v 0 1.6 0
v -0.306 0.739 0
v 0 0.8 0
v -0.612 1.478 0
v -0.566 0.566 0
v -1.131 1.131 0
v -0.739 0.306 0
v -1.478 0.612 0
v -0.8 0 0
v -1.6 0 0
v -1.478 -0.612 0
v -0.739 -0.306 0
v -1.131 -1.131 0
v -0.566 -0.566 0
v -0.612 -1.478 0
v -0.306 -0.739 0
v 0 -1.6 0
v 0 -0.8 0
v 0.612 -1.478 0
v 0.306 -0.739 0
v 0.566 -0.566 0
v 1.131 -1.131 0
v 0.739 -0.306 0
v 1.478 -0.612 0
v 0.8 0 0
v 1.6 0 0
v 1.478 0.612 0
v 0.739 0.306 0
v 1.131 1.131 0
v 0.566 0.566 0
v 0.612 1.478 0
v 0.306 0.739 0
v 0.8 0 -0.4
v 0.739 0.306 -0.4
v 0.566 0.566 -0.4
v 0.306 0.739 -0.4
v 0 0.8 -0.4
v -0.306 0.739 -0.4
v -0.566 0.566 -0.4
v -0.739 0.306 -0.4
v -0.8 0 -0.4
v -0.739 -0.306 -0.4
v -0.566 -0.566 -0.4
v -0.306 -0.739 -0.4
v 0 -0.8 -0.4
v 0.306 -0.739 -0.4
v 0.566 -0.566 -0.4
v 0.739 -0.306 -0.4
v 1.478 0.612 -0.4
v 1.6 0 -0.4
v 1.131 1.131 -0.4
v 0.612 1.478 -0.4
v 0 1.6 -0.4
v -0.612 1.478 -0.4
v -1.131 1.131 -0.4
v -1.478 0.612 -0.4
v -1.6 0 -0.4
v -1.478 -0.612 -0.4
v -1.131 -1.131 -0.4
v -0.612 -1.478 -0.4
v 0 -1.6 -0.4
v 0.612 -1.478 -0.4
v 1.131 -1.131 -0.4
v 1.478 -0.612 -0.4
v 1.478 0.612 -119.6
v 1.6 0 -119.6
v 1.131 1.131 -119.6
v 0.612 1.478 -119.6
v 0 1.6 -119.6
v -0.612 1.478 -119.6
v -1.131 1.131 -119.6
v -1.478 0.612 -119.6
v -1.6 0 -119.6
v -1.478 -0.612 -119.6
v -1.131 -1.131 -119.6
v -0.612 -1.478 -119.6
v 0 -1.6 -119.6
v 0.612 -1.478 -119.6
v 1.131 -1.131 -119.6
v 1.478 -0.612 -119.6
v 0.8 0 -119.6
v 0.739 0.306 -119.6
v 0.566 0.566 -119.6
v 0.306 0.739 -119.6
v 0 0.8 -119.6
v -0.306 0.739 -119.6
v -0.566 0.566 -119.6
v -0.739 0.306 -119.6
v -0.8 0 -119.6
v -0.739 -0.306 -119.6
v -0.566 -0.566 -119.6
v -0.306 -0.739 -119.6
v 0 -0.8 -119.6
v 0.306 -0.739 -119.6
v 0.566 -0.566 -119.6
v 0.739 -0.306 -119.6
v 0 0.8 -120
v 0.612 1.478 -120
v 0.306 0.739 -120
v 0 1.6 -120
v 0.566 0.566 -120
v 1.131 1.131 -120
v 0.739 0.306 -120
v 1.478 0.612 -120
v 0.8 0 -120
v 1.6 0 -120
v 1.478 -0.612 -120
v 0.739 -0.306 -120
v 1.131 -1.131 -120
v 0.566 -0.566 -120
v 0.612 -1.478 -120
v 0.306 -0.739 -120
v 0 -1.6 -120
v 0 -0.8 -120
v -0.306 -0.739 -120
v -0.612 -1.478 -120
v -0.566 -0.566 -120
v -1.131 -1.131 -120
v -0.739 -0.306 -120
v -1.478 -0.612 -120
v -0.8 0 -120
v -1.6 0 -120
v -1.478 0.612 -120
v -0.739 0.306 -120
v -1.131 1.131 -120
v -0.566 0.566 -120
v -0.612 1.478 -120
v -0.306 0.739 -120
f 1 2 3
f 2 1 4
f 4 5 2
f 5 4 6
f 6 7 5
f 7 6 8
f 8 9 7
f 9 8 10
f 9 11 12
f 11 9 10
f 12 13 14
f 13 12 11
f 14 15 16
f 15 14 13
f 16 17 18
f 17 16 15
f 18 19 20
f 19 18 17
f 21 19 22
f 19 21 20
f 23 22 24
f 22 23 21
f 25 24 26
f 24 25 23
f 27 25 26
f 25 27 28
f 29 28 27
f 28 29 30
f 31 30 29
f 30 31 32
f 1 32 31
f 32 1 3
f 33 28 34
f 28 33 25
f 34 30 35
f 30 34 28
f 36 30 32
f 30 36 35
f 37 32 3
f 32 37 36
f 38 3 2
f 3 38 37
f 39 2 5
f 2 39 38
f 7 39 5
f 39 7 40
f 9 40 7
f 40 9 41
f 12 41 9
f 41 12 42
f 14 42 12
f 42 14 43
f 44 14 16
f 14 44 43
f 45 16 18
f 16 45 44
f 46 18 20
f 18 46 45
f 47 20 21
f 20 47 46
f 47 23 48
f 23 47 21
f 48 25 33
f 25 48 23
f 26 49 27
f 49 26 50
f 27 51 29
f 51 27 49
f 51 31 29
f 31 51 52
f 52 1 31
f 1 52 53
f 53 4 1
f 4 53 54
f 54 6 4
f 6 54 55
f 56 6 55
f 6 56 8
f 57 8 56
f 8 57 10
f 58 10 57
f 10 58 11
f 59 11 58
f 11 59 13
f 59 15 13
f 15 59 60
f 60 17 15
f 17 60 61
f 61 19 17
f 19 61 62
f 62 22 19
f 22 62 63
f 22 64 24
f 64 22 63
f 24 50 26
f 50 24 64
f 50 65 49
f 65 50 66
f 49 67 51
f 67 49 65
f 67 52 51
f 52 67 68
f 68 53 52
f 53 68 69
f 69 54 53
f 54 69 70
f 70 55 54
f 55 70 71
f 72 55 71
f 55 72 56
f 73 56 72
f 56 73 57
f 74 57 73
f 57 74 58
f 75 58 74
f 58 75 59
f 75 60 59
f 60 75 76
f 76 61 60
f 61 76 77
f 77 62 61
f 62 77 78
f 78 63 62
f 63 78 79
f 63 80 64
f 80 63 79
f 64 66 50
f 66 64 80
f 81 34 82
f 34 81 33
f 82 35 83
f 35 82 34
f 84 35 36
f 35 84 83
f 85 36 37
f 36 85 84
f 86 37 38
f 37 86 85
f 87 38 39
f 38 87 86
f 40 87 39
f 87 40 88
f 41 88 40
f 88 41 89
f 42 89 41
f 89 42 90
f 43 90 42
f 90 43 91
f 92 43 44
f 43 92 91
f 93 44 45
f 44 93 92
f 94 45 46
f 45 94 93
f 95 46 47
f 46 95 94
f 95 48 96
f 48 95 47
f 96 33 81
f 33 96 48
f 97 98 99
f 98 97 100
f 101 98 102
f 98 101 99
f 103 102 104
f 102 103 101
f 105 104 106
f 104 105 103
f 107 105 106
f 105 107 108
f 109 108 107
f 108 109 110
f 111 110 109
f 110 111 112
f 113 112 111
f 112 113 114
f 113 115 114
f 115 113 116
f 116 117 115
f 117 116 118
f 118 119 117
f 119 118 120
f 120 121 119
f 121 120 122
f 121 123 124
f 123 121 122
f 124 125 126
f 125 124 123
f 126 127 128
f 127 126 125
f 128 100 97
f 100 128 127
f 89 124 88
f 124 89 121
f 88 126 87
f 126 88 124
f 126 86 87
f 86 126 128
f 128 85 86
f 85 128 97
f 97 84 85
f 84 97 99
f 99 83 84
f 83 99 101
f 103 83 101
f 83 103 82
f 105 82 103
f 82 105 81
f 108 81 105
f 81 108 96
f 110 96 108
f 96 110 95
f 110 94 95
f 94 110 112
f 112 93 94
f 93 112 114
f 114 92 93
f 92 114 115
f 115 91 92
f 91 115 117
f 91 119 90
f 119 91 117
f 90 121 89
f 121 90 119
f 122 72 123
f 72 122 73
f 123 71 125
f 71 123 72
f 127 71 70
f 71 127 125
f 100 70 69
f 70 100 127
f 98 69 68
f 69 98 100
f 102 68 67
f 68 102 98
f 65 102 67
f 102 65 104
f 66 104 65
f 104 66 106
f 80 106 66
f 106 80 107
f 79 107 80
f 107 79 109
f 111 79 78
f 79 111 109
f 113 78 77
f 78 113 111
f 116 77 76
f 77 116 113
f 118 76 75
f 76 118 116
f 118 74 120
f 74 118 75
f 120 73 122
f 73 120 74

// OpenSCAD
// file: ../p/4-4ring1.scad
use <../lib.scad>
function ldraw_lib__4_4ring1() = [
// 0 Ring  1 x 1.0
// 0 Name: 4-4ring1.dat
// 0 Author: James Jessiman
// 0 !LDRAW_ORG Primitive UPDATE 2009-01
// 0 !LICENSE Licensed under CC BY 2.0 and CC BY 4.0 : see CAreadme.txt
// 
// 0 BFC CERTIFY CCW
  [0,"BFC","CERTIFY"],
  [0,"BFC","CCW"],
// 
// 0 !HISTORY 1998-12-15 [PTadmin] Official Update 1998-10
// 0 !HISTORY 2002-04-08 [BrickCaster] Modified for BFC compliance
// 0 !HISTORY 2002-04-25 [PTadmin] Official Update 2002-02
// 0 !HISTORY 2007-06-24 [PTadmin] Header formatted for Contributor Agreement
// 0 !HISTORY 2008-07-01 [PTadmin] Official Update 2008-01
// 0 !HISTORY 2008-08-26 [cwdee] Switch polygon winding and rename
// 0 !HISTORY 2009-05-02 [PTadmin] Official Update 2009-01
// 
// 
// 4 16 -0.7654 0 1.8478 -0.3827 0 0.9239 0 0 1 0 0 2
  [4,16,-0.7654,0,1.8478,-0.3827,0,0.9239,0,0,1,0,0,2],
// 4 16 -1.4142 0 1.4142 -0.7071 0 0.7071 -0.3827 0 0.9239 -0.7654 0 1.8478
  [4,16,-1.4142,0,1.4142,-0.7071,0,0.7071,-0.3827,0,0.9239,-0.7654,0,1.8478],
// 4 16 -1.8478 0 0.7654 -0.9239 0 0.3827 -0.7071 0 0.7071 -1.4142 0 1.41420
  [4,16,-1.8478,0,0.7654,-0.9239,0,0.3827,-0.7071,0,0.7071,-1.4142,0,1.41420],
// 4 16 -2 0 0 -1 0 0 -0.9239 0 0.3827 -1.8478 0 0.7654
  [4,16,-2,0,0,-1,0,0,-0.9239,0,0.3827,-1.8478,0,0.7654],
// 4 16 -1.8478 0 -0.7654 -0.9239 0 -0.3827 -1 0 0 -2 0 0
  [4,16,-1.8478,0,-0.7654,-0.9239,0,-0.3827,-1,0,0,-2,0,0],
// 4 16 -1.4142 0 -1.4142 -0.7071 0 -0.7071 -0.9239 0 -0.3827 -1.8478 0 -0.7654
  [4,16,-1.4142,0,-1.4142,-0.7071,0,-0.7071,-0.9239,0,-0.3827,-1.8478,0,-0.7654],
// 4 16 -0.7654 0 -1.8478 -0.3827 0 -0.9239 -0.7071 0 -0.7071 -1.4142 0 -1.4142
  [4,16,-0.7654,0,-1.8478,-0.3827,0,-0.9239,-0.7071,0,-0.7071,-1.4142,0,-1.4142],
// 4 16 0 0 -2 0 0 -1 -0.3827 0 -0.9239 -0.7654 0 -1.8478
  [4,16,0,0,-2,0,0,-1,-0.3827,0,-0.9239,-0.7654,0,-1.8478],
// 4 16 0.7654 0 -1.8478 0.3827 0 -0.9239 0 0 -1 0 0 -2
  [4,16,0.7654,0,-1.8478,0.3827,0,-0.9239,0,0,-1,0,0,-2],
// 4 16 1.4142 0 -1.4142 0.7071 0 -0.7071 0.3827 0 -0.9239 0.7654 0 -1.8478
  [4,16,1.4142,0,-1.4142,0.7071,0,-0.7071,0.3827,0,-0.9239,0.7654,0,-1.8478],
// 4 16 1.8478 0 -0.7654 0.9239 0 -0.3827 0.7071 0 -0.7071 1.4142 0 -1.4142
  [4,16,1.8478,0,-0.7654,0.9239,0,-0.3827,0.7071,0,-0.7071,1.4142,0,-1.4142],
// 4 16 2 0 0 1 0 0 0.9239 0 -0.3827 1.8478 0 -0.7654
  [4,16,2,0,0,1,0,0,0.9239,0,-0.3827,1.8478,0,-0.7654],
// 4 16 1.8478 0 0.7654 0.9239 0 0.3827 1 0 0 2 0 0
  [4,16,1.8478,0,0.7654,0.9239,0,0.3827,1,0,0,2,0,0],
// 4 16 1.4142 0 1.4142 0.7071 0 0.7071 0.9239 0 0.3827 1.8478 0 0.7654
  [4,16,1.4142,0,1.4142,0.7071,0,0.7071,0.9239,0,0.3827,1.8478,0,0.7654],
// 4 16 0.7654 0 1.8478 0.3827 0 0.9239 0.7071 0 0.7071 1.4142 0 1.4142
  [4,16,0.7654,0,1.8478,0.3827,0,0.9239,0.7071,0,0.7071,1.4142,0,1.4142],
// 4 16 0 0 2 0 0 1 0.3827 0 0.9239 0.7654 0 1.8478
  [4,16,0,0,2,0,0,1,0.3827,0,0.9239,0.7654,0,1.8478],
// 0
];
makepoly(ldraw_lib__4_4ring1(), line=0.2);
// file: ../p/4-4edge.scad
use <../lib.scad>
function ldraw_lib__4_4edge() = [
// 0 Circle 1.0
// 0 Name: 4-4edge.dat
// 0 Author: James Jessiman
// 0 !LDRAW_ORG Primitive UPDATE 2017-01
// 0 !LICENSE Licensed under CC BY 2.0 and CC BY 4.0 : see CAreadme.txt
// 
// 0 BFC CERTIFY CCW
  [0,"BFC","CERTIFY"],
  [0,"BFC","CCW"],
// 
// 0 !HISTORY 1998-12-15 [PTadmin] Official Update 1998-10
// 0 !HISTORY 2005-12-28 [PTadmin] Official Update 2005-01
// 0 !HISTORY 2007-06-24 [PTadmin] Header formatted for Contributor Agreement
// 0 !HISTORY 2008-07-01 [PTadmin] Official Update 2008-01
// 0 !HISTORY 2017-01-15 [Steffen] BFCed
// 0 !HISTORY 2017-12-30 [PTadmin] Official Update 2017-01
// 
// 
// 2 24 1 0 0 0.9239 0 0.3827
  [2,24,1,0,0,0.9239,0,0.3827],
// 2 24 0.9239 0 0.3827 0.7071 0 0.7071
  [2,24,0.9239,0,0.3827,0.7071,0,0.7071],
// 2 24 0.7071 0 0.7071 0.3827 0 0.9239
  [2,24,0.7071,0,0.7071,0.3827,0,0.9239],
// 2 24 0.3827 0 0.9239 0 0 1
  [2,24,0.3827,0,0.9239,0,0,1],
// 2 24 0 0 1 -0.3827 0 0.9239
  [2,24,0,0,1,-0.3827,0,0.9239],
// 2 24 -0.3827 0 0.9239 -0.7071 0 0.7071
  [2,24,-0.3827,0,0.9239,-0.7071,0,0.7071],
// 2 24 -0.7071 0 0.7071 -0.9239 0 0.3827
  [2,24,-0.7071,0,0.7071,-0.9239,0,0.3827],
// 2 24 -0.9239 0 0.3827 -1 0 -0
  [2,24,-0.9239,0,0.3827,-1,0,-0],
// 2 24 -1 0 -0 -0.9239 0 -0.3827
  [2,24,-1,0,-0,-0.9239,0,-0.3827],
// 2 24 -0.9239 0 -0.3827 -0.7071 0 -0.7071
  [2,24,-0.9239,0,-0.3827,-0.7071,0,-0.7071],
// 2 24 -0.7071 0 -0.7071 -0.3827 0 -0.9239
  [2,24,-0.7071,0,-0.7071,-0.3827,0,-0.9239],
// 2 24 -0.3827 0 -0.9239 0 0 -1
  [2,24,-0.3827,0,-0.9239,0,0,-1],
// 2 24 0 0 -1 0.3827 0 -0.9239
  [2,24,0,0,-1,0.3827,0,-0.9239],
// 2 24 0.3827 0 -0.9239 0.7071 0 -0.7071
  [2,24,0.3827,0,-0.9239,0.7071,0,-0.7071],
// 2 24 0.7071 0 -0.7071 0.9239 0 -0.3827
  [2,24,0.7071,0,-0.7071,0.9239,0,-0.3827],
// 2 24 0.9239 0 -0.3827 1 0 0
  [2,24,0.9239,0,-0.3827,1,0,0],
];
makepoly(ldraw_lib__4_4edge(), line=0.2);
// file: ../p/4-4cyli.scad
use <../lib.scad>
function ldraw_lib__4_4cyli() = [
// 0 Cylinder 1.0
// 0 Name: 4-4cyli.dat
// 0 Author: James Jessiman
// 0 !LDRAW_ORG Primitive UPDATE 2005-01
// 0 !LICENSE Licensed under CC BY 2.0 and CC BY 4.0 : see CAreadme.txt
// 
// 0 BFC CERTIFY CCW
  [0,"BFC","CERTIFY"],
  [0,"BFC","CCW"],
// 
// 0 !HISTORY 1998-12-15 [PTadmin] Official Update 1998-10
// 0 !HISTORY 2002-03-23 [sbliss] Added BFC statement; merged headers from files in distributions LDraw 0.27 and Complete.
// 0 !HISTORY 2002-04-25 [PTadmin] Official Update 2002-02
// 0 !HISTORY 2004-12-14 [guyvivan] BFC CCW
// 0 !HISTORY 2005-12-28 [PTadmin] Official Update 2005-01
// 0 !HISTORY 2007-06-24 [PTadmin] Header formatted for Contributor Agreement
// 0 !HISTORY 2008-07-01 [PTadmin] Official Update 2008-01
// 
// 
// 4 16 1 1 0 0.9239 1 0.3827 0.9239 0 0.3827 1 0 0
  [4,16,1,1,0,0.9239,1,0.3827,0.9239,0,0.3827,1,0,0],
// 5 24 1 0 0 1 1 0 0.9239 0 0.3827 0.9239 0 -0.3827
  [5,24,1,0,0,1,1,0,0.9239,0,0.3827,0.9239,0,-0.3827],
// 4 16 0.9239 1 0.3827 0.7071 1 0.7071 0.7071 0 0.7071 0.9239 0 0.3827
  [4,16,0.9239,1,0.3827,0.7071,1,0.7071,0.7071,0,0.7071,0.9239,0,0.3827],
// 5 24 0.9239 0 0.3827 0.9239 1 0.3827 0.7071 0 0.7071 1 0 0
  [5,24,0.9239,0,0.3827,0.9239,1,0.3827,0.7071,0,0.7071,1,0,0],
// 4 16 0.7071 1 0.7071 0.3827 1 0.9239 0.3827 0 0.9239 0.7071 0 0.7071
  [4,16,0.7071,1,0.7071,0.3827,1,0.9239,0.3827,0,0.9239,0.7071,0,0.7071],
// 5 24 0.7071 0 0.7071 0.7071 1 0.7071 0.3827 0 0.9239 0.9239 0 0.3827
  [5,24,0.7071,0,0.7071,0.7071,1,0.7071,0.3827,0,0.9239,0.9239,0,0.3827],
// 4 16 0.3827 1 0.9239 0 1 1 0 0 1 0.3827 0 0.9239
  [4,16,0.3827,1,0.9239,0,1,1,0,0,1,0.3827,0,0.9239],
// 5 24 0.3827 0 0.9239 0.3827 1 0.9239 0 0 1 0.7071 0 0.7071
  [5,24,0.3827,0,0.9239,0.3827,1,0.9239,0,0,1,0.7071,0,0.7071],
// 4 16 0 1 1 -0.3827 1 0.9239 -0.3827 0 0.9239 0 0 1
  [4,16,0,1,1,-0.3827,1,0.9239,-0.3827,0,0.9239,0,0,1],
// 5 24 0 0 1 0 1 1 -0.3827 0 0.9239 0.3827 0 0.9239
  [5,24,0,0,1,0,1,1,-0.3827,0,0.9239,0.3827,0,0.9239],
// 4 16 -0.3827 1 0.9239 -0.7071 1 0.7071 -0.7071 0 0.7071 -0.3827 0 0.9239
  [4,16,-0.3827,1,0.9239,-0.7071,1,0.7071,-0.7071,0,0.7071,-0.3827,0,0.9239],
// 5 24 -0.3827 0 0.9239 -0.3827 1 0.9239 -0.7071 0 0.7071 0 0 1
  [5,24,-0.3827,0,0.9239,-0.3827,1,0.9239,-0.7071,0,0.7071,0,0,1],
// 4 16 -0.7071 1 0.7071 -0.9239 1 0.3827 -0.9239 0 0.3827 -0.7071 0 0.7071
  [4,16,-0.7071,1,0.7071,-0.9239,1,0.3827,-0.9239,0,0.3827,-0.7071,0,0.7071],
// 5 24 -0.7071 0 0.7071 -0.7071 1 0.7071 -0.9239 0 0.3827 -0.3827 0 0.9239
  [5,24,-0.7071,0,0.7071,-0.7071,1,0.7071,-0.9239,0,0.3827,-0.3827,0,0.9239],
// 4 16 -0.9239 1 0.3827 -1 1 0 -1 0 0 -0.9239 0 0.3827
  [4,16,-0.9239,1,0.3827,-1,1,0,-1,0,0,-0.9239,0,0.3827],
// 5 24 -0.9239 0 0.3827 -0.9239 1 0.3827 -1 0 0 -0.7071 0 0.7071
  [5,24,-0.9239,0,0.3827,-0.9239,1,0.3827,-1,0,0,-0.7071,0,0.7071],
// 4 16 -1 1 0 -0.9239 1 -0.3827 -0.9239 0 -0.3827 -1 0 0
  [4,16,-1,1,0,-0.9239,1,-0.3827,-0.9239,0,-0.3827,-1,0,0],
// 5 24 -1 0 0 -1 1 0 -0.9239 0 -0.3827 -0.9239 0 0.3827
  [5,24,-1,0,0,-1,1,0,-0.9239,0,-0.3827,-0.9239,0,0.3827],
// 4 16 -0.9239 1 -0.3827 -0.7071 1 -0.7071 -0.7071 0 -0.7071 -0.9239 0 -0.3827
  [4,16,-0.9239,1,-0.3827,-0.7071,1,-0.7071,-0.7071,0,-0.7071,-0.9239,0,-0.3827],
// 5 24 -0.9239 0 -0.3827 -0.9239 1 -0.3827 -0.7071 0 -0.7071 -1 0 0
  [5,24,-0.9239,0,-0.3827,-0.9239,1,-0.3827,-0.7071,0,-0.7071,-1,0,0],
// 4 16 -0.7071 1 -0.7071 -0.3827 1 -0.9239 -0.3827 0 -0.9239 -0.7071 0 -0.7071
  [4,16,-0.7071,1,-0.7071,-0.3827,1,-0.9239,-0.3827,0,-0.9239,-0.7071,0,-0.7071],
// 5 24 -0.7071 0 -0.7071 -0.7071 1 -0.7071 -0.3827 0 -0.9239 -0.9239 0 -0.3827
  [5,24,-0.7071,0,-0.7071,-0.7071,1,-0.7071,-0.3827,0,-0.9239,-0.9239,0,-0.3827],
// 4 16 -0.3827 1 -0.9239 0 1 -1 0 0 -1 -0.3827 0 -0.9239
  [4,16,-0.3827,1,-0.9239,0,1,-1,0,0,-1,-0.3827,0,-0.9239],
// 5 24 -0.3827 0 -0.9239 -0.3827 1 -0.9239 0 0 -1 -0.7071 0 -0.7071
  [5,24,-0.3827,0,-0.9239,-0.3827,1,-0.9239,0,0,-1,-0.7071,0,-0.7071],
// 4 16 0 1 -1 0.3827 1 -0.9239 0.3827 0 -0.9239 0 0 -1
  [4,16,0,1,-1,0.3827,1,-0.9239,0.3827,0,-0.9239,0,0,-1],
// 5 24 0 0 -1 0 1 -1 0.3827 0 -0.9239 -0.3827 0 -0.9239
  [5,24,0,0,-1,0,1,-1,0.3827,0,-0.9239,-0.3827,0,-0.9239],
// 4 16 0.3827 1 -0.9239 0.7071 1 -0.7071 0.7071 0 -0.7071 0.3827 0 -0.9239
  [4,16,0.3827,1,-0.9239,0.7071,1,-0.7071,0.7071,0,-0.7071,0.3827,0,-0.9239],
// 5 24 0.3827 0 -0.9239 0.3827 1 -0.9239 0.7071 0 -0.7071 0 0 -1
  [5,24,0.3827,0,-0.9239,0.3827,1,-0.9239,0.7071,0,-0.7071,0,0,-1],
// 4 16 0.7071 1 -0.7071 0.9239 1 -0.3827 0.9239 0 -0.3827 0.7071 0 -0.7071
  [4,16,0.7071,1,-0.7071,0.9239,1,-0.3827,0.9239,0,-0.3827,0.7071,0,-0.7071],
// 5 24 0.7071 0 -0.7071 0.7071 1 -0.7071 0.9239 0 -0.3827 0.3827 0 -0.9239
  [5,24,0.7071,0,-0.7071,0.7071,1,-0.7071,0.9239,0,-0.3827,0.3827,0,-0.9239],
// 4 16 0.9239 1 -0.3827 1 1 0 1 0 0 0.9239 0 -0.3827
  [4,16,0.9239,1,-0.3827,1,1,0,1,0,0,0.9239,0,-0.3827],
// 5 24 0.9239 0 -0.3827 0.9239 1 -0.3827 1 0 0 0.7071 0 -0.7071
  [5,24,0.9239,0,-0.3827,0.9239,1,-0.3827,1,0,0,0.7071,0,-0.7071],
// 0
];
makepoly(ldraw_lib__4_4cyli(), line=0.2);
// file: u9053.scad
use <../lib.scad>
use <../p/4-4cyli.scad>
use <../p/4-4edge.scad>
use <../p/4-4ring1.scad>
function ldraw_lib__u9053() = [
// 0 ~Technic Flex-System Hose End
// 0 Name: u9053.dat
// 0 Author: William Howard [WilliamH]
// 0 !LDRAW_ORG Part UPDATE 2011-02
// 0 !LICENSE Licensed under CC BY 2.0 and CC BY 4.0 : see CAreadme.txt
// 
// 0 BFC CERTIFY CCW
  [0,"BFC","CERTIFY"],
  [0,"BFC","CCW"],
// 
// 0 !HISTORY 2011-12-21 [cwdee] Reworked subparting technique
// 0 !HISTORY 2011-12-23 [PTadmin] Renamed from 76
// 0 !HISTORY 2011-12-29 [PTadmin] Official Update 2011-02
// 
// 
// 1 16 0 0 0 2 0 0 0 1 0 0 0 2 4-4ring1.dat
  [1,16,0,0,0,2,0,0,0,1,0,0,0,2, ldraw_lib__4_4ring1()],
// 1 16 0 0 0 2 0 0 0 1 0 0 0 2 4-4edge.dat
  [1,16,0,0,0,2,0,0,0,1,0,0,0,2, ldraw_lib__4_4edge()],
// 0 BFC INVERTNEXT
  [0,"BFC","INVERTNEXT"],
// 1 16 0 0 0 2 0 0 0 1 0 0 0 2 4-4cyli.dat
  [1,16,0,0,0,2,0,0,0,1,0,0,0,2, ldraw_lib__4_4cyli()],
// 1 16 0 0 0 4 0 0 0 1 0 0 0 4 4-4edge.dat
  [1,16,0,0,0,4,0,0,0,1,0,0,0,4, ldraw_lib__4_4edge()],
// 1 16 0 0 0 4 0 0 0 1 0 0 0 4 4-4cyli.dat
  [1,16,0,0,0,4,0,0,0,1,0,0,0,4, ldraw_lib__4_4cyli()],
// 0
];
makepoly(ldraw_lib__u9053(), line=0.2);
// file: 77.scad
use <../lib.scad>
use <../p/4-4cyli.scad>
function ldraw_lib__77() = [
// 0 ~Technic Flex-System Hose Segment
// 0 Name: 77.dat
// 0 Author: William Howard [WilliamH]
// 0 !LDRAW_ORG Part UPDATE 2011-02
// 0 !LICENSE Licensed under CC BY 2.0 and CC BY 4.0 : see CAreadme.txt
// 
// 0 BFC CERTIFY CCW
  [0,"BFC","CERTIFY"],
  [0,"BFC","CCW"],
// 
// 0 !HISTORY 2011-12-21 [cwdee] Reworked subparting technique
// 0 !HISTORY 2011-12-29 [PTadmin] Official Update 2011-02
// 
// 
// 1 16 0 0 0 4 0 0 0 1 0 0 0 4 4-4cyli.dat
  [1,16,0,0,0,4,0,0,0,1,0,0,0,4, ldraw_lib__4_4cyli()],
// 0 BFC INVERTNEXT
  [0,"BFC","INVERTNEXT"],
// 1 16 0 0 0 2 0 0 0 1 0 0 0 2 4-4cyli.dat
  [1,16,0,0,0,2,0,0,0,1,0,0,0,2, ldraw_lib__4_4cyli()],
// 0
];
makepoly(ldraw_lib__77(), line=0.2);
// main file
use <../lib.scad>
use <77.scad>
use <u9053.scad>
function ldraw_lib__71194() = [
// 0 Technic Flex-System Hose 15L (300LDU)
// 0 Name: 71194.dat
// 0 Author: Tim Gould [timgould]
// 0 !LDRAW_ORG Part UPDATE 2011-02
// 0 !LICENSE Licensed under CC BY 2.0 and CC BY 4.0 : see CAreadme.txt
// 
// 0 BFC CERTIFY CCW
  [0,"BFC","CERTIFY"],
  [0,"BFC","CCW"],
// 
// 0 !KEYWORDS bar, tube
// 
// 0 !HISTORY 2011-12-29 [PTadmin] Official Update 2011-02
// 
// 
// 1 16 0 0 0 1 0 0 0 1 0 0 0 1 u9053.dat
  [1,16,0,0,0,1,0,0,0,1,0,0,0,1, ldraw_lib__u9053()],
// 1 16 0 1 0 1 0 0 0 298 0 0 0 1 77.dat
  [1,16,0,1,0,1,0,0,0,298,0,0,0,1, ldraw_lib__77()],
// 1 16 0 300 0 -1 0 0 0 -1 0 0 0 1 u9053.dat
  [1,16,0,300,0,-1,0,0,0,-1,0,0,0,1, ldraw_lib__u9053()],
];
makepoly(ldraw_lib__71194(), line=0.2);
